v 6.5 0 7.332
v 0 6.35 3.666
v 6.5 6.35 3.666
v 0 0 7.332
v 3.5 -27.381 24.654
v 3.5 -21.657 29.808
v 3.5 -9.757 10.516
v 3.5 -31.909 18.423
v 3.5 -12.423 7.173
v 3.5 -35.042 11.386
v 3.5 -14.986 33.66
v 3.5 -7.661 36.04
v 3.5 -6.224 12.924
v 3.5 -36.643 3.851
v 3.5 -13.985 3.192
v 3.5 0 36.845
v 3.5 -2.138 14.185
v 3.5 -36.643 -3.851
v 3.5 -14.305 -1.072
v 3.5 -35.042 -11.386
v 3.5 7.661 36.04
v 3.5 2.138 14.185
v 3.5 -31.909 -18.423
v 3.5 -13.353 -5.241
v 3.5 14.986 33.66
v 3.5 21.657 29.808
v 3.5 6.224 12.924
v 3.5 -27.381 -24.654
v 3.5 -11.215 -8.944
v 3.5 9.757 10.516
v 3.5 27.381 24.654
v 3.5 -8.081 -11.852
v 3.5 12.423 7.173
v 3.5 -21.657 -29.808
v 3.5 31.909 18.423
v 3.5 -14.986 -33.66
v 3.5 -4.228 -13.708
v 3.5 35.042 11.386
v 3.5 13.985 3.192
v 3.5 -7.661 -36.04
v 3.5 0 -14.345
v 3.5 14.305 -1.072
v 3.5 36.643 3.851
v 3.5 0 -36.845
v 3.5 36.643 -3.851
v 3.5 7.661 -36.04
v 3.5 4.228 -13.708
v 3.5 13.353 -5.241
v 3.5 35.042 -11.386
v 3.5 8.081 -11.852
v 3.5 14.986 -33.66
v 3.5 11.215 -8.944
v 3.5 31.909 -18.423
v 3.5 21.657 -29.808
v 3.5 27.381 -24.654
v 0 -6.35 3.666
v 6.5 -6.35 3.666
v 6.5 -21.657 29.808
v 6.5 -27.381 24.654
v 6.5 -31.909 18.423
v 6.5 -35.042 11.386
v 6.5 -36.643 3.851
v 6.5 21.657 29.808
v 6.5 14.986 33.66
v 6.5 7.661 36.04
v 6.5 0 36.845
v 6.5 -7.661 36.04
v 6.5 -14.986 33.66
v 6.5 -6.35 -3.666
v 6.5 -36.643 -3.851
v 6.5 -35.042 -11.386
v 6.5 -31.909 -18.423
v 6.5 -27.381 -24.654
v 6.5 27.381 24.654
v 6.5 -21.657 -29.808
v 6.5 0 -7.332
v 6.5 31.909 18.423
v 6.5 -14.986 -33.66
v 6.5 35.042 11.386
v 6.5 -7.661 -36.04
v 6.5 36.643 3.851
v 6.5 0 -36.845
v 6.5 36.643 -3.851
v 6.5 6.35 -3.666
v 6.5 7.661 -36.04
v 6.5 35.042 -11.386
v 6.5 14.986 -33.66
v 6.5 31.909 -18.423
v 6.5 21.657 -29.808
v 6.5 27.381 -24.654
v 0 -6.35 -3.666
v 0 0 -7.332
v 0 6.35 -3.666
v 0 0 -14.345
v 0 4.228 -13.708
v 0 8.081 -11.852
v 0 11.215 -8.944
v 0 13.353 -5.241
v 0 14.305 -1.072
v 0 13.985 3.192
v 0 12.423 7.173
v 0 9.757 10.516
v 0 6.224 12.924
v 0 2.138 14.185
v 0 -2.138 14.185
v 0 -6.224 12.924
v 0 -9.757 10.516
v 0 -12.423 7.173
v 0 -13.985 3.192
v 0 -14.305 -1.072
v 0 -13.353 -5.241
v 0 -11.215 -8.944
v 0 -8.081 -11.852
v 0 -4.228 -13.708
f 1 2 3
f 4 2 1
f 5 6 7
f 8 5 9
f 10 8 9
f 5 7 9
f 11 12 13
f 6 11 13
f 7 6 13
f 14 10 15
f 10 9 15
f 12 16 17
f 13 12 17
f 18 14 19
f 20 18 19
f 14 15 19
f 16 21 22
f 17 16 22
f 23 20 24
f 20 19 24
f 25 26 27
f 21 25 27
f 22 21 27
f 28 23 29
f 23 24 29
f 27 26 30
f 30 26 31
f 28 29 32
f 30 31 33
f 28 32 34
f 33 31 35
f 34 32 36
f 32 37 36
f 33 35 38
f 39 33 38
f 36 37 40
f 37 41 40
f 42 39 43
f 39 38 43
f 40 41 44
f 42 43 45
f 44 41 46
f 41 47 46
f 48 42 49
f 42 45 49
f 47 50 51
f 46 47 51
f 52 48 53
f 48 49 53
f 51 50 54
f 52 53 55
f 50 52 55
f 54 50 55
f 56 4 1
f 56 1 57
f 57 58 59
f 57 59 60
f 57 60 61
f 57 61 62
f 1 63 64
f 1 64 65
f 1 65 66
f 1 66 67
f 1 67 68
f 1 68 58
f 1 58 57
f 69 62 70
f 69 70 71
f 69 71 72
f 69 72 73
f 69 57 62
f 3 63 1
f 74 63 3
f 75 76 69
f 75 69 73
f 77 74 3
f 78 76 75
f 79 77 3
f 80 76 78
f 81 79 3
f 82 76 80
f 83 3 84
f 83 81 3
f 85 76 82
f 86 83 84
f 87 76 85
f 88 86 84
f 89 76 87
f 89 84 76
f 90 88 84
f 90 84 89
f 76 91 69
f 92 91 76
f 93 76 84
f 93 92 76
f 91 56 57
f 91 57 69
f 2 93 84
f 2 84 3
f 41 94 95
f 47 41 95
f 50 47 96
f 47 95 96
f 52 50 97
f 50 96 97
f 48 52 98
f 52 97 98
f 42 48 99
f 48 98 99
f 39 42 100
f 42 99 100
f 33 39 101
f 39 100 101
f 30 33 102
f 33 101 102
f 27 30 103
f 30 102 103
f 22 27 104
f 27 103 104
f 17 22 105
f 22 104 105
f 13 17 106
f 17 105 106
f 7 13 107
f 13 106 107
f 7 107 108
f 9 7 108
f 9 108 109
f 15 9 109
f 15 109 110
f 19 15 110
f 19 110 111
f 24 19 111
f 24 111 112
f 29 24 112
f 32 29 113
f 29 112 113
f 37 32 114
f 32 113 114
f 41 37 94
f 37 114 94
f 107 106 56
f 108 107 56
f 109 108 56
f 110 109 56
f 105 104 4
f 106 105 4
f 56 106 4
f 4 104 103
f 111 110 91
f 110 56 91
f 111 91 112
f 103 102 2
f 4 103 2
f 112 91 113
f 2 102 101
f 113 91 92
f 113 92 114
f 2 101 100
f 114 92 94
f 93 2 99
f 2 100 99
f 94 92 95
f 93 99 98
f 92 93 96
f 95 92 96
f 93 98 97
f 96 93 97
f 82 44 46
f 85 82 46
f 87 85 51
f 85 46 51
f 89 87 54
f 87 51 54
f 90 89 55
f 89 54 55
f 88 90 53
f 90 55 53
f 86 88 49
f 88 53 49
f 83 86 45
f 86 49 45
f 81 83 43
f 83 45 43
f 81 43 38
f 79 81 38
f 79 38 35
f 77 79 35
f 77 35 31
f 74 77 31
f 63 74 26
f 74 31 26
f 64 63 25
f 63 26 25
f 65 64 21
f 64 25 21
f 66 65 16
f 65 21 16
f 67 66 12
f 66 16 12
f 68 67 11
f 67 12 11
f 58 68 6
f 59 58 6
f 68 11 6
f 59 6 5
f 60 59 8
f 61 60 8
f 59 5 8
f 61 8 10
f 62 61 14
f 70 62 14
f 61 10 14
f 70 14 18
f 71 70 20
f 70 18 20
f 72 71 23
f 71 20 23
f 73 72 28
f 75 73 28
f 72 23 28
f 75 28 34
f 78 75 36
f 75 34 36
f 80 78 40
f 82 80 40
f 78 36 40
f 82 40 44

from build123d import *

# Parameters (mm, degrees)
CROQUIS1_R              = 14.345
SALIENTE_EXTRUIR1_DEPTH = 3.5
CROQUIS2_R              = 36.845
SALIENTE_EXTRUIR2_DEPTH = 3


with BuildPart() as part:
    # Croquis1 → Saliente-Extruir1 (new body)
    with BuildSketch(Plane(origin=(0, 0, 0), x_dir=(0, 0, -1), z_dir=(1, 0, 0))):
        Circle(CROQUIS1_R)
        Polygon((7.332348419, 0), (3.666174209, 6.35), (-3.666174209, 6.35), (-7.332348419, 0), (-3.666174209, -6.35), (3.666174209, -6.35), align=None, mode=Mode.SUBTRACT)
    extrude(amount=SALIENTE_EXTRUIR1_DEPTH)

    # Croquis2 → Saliente-Extruir2 (add)
    with BuildSketch(Plane(origin=(3.5, 0, 0), x_dir=(0, 0, -1), z_dir=(1, 0, 0))):
        Circle(CROQUIS2_R)
        Polygon((7.332348419, 0), (3.666174209, 6.35), (-3.666174209, 6.35), (-7.332348419, 0), (-3.666174209, -6.35), (3.666174209, -6.35), align=None, mode=Mode.SUBTRACT)
    extrude(amount=SALIENTE_EXTRUIR2_DEPTH)


solid = part.part
